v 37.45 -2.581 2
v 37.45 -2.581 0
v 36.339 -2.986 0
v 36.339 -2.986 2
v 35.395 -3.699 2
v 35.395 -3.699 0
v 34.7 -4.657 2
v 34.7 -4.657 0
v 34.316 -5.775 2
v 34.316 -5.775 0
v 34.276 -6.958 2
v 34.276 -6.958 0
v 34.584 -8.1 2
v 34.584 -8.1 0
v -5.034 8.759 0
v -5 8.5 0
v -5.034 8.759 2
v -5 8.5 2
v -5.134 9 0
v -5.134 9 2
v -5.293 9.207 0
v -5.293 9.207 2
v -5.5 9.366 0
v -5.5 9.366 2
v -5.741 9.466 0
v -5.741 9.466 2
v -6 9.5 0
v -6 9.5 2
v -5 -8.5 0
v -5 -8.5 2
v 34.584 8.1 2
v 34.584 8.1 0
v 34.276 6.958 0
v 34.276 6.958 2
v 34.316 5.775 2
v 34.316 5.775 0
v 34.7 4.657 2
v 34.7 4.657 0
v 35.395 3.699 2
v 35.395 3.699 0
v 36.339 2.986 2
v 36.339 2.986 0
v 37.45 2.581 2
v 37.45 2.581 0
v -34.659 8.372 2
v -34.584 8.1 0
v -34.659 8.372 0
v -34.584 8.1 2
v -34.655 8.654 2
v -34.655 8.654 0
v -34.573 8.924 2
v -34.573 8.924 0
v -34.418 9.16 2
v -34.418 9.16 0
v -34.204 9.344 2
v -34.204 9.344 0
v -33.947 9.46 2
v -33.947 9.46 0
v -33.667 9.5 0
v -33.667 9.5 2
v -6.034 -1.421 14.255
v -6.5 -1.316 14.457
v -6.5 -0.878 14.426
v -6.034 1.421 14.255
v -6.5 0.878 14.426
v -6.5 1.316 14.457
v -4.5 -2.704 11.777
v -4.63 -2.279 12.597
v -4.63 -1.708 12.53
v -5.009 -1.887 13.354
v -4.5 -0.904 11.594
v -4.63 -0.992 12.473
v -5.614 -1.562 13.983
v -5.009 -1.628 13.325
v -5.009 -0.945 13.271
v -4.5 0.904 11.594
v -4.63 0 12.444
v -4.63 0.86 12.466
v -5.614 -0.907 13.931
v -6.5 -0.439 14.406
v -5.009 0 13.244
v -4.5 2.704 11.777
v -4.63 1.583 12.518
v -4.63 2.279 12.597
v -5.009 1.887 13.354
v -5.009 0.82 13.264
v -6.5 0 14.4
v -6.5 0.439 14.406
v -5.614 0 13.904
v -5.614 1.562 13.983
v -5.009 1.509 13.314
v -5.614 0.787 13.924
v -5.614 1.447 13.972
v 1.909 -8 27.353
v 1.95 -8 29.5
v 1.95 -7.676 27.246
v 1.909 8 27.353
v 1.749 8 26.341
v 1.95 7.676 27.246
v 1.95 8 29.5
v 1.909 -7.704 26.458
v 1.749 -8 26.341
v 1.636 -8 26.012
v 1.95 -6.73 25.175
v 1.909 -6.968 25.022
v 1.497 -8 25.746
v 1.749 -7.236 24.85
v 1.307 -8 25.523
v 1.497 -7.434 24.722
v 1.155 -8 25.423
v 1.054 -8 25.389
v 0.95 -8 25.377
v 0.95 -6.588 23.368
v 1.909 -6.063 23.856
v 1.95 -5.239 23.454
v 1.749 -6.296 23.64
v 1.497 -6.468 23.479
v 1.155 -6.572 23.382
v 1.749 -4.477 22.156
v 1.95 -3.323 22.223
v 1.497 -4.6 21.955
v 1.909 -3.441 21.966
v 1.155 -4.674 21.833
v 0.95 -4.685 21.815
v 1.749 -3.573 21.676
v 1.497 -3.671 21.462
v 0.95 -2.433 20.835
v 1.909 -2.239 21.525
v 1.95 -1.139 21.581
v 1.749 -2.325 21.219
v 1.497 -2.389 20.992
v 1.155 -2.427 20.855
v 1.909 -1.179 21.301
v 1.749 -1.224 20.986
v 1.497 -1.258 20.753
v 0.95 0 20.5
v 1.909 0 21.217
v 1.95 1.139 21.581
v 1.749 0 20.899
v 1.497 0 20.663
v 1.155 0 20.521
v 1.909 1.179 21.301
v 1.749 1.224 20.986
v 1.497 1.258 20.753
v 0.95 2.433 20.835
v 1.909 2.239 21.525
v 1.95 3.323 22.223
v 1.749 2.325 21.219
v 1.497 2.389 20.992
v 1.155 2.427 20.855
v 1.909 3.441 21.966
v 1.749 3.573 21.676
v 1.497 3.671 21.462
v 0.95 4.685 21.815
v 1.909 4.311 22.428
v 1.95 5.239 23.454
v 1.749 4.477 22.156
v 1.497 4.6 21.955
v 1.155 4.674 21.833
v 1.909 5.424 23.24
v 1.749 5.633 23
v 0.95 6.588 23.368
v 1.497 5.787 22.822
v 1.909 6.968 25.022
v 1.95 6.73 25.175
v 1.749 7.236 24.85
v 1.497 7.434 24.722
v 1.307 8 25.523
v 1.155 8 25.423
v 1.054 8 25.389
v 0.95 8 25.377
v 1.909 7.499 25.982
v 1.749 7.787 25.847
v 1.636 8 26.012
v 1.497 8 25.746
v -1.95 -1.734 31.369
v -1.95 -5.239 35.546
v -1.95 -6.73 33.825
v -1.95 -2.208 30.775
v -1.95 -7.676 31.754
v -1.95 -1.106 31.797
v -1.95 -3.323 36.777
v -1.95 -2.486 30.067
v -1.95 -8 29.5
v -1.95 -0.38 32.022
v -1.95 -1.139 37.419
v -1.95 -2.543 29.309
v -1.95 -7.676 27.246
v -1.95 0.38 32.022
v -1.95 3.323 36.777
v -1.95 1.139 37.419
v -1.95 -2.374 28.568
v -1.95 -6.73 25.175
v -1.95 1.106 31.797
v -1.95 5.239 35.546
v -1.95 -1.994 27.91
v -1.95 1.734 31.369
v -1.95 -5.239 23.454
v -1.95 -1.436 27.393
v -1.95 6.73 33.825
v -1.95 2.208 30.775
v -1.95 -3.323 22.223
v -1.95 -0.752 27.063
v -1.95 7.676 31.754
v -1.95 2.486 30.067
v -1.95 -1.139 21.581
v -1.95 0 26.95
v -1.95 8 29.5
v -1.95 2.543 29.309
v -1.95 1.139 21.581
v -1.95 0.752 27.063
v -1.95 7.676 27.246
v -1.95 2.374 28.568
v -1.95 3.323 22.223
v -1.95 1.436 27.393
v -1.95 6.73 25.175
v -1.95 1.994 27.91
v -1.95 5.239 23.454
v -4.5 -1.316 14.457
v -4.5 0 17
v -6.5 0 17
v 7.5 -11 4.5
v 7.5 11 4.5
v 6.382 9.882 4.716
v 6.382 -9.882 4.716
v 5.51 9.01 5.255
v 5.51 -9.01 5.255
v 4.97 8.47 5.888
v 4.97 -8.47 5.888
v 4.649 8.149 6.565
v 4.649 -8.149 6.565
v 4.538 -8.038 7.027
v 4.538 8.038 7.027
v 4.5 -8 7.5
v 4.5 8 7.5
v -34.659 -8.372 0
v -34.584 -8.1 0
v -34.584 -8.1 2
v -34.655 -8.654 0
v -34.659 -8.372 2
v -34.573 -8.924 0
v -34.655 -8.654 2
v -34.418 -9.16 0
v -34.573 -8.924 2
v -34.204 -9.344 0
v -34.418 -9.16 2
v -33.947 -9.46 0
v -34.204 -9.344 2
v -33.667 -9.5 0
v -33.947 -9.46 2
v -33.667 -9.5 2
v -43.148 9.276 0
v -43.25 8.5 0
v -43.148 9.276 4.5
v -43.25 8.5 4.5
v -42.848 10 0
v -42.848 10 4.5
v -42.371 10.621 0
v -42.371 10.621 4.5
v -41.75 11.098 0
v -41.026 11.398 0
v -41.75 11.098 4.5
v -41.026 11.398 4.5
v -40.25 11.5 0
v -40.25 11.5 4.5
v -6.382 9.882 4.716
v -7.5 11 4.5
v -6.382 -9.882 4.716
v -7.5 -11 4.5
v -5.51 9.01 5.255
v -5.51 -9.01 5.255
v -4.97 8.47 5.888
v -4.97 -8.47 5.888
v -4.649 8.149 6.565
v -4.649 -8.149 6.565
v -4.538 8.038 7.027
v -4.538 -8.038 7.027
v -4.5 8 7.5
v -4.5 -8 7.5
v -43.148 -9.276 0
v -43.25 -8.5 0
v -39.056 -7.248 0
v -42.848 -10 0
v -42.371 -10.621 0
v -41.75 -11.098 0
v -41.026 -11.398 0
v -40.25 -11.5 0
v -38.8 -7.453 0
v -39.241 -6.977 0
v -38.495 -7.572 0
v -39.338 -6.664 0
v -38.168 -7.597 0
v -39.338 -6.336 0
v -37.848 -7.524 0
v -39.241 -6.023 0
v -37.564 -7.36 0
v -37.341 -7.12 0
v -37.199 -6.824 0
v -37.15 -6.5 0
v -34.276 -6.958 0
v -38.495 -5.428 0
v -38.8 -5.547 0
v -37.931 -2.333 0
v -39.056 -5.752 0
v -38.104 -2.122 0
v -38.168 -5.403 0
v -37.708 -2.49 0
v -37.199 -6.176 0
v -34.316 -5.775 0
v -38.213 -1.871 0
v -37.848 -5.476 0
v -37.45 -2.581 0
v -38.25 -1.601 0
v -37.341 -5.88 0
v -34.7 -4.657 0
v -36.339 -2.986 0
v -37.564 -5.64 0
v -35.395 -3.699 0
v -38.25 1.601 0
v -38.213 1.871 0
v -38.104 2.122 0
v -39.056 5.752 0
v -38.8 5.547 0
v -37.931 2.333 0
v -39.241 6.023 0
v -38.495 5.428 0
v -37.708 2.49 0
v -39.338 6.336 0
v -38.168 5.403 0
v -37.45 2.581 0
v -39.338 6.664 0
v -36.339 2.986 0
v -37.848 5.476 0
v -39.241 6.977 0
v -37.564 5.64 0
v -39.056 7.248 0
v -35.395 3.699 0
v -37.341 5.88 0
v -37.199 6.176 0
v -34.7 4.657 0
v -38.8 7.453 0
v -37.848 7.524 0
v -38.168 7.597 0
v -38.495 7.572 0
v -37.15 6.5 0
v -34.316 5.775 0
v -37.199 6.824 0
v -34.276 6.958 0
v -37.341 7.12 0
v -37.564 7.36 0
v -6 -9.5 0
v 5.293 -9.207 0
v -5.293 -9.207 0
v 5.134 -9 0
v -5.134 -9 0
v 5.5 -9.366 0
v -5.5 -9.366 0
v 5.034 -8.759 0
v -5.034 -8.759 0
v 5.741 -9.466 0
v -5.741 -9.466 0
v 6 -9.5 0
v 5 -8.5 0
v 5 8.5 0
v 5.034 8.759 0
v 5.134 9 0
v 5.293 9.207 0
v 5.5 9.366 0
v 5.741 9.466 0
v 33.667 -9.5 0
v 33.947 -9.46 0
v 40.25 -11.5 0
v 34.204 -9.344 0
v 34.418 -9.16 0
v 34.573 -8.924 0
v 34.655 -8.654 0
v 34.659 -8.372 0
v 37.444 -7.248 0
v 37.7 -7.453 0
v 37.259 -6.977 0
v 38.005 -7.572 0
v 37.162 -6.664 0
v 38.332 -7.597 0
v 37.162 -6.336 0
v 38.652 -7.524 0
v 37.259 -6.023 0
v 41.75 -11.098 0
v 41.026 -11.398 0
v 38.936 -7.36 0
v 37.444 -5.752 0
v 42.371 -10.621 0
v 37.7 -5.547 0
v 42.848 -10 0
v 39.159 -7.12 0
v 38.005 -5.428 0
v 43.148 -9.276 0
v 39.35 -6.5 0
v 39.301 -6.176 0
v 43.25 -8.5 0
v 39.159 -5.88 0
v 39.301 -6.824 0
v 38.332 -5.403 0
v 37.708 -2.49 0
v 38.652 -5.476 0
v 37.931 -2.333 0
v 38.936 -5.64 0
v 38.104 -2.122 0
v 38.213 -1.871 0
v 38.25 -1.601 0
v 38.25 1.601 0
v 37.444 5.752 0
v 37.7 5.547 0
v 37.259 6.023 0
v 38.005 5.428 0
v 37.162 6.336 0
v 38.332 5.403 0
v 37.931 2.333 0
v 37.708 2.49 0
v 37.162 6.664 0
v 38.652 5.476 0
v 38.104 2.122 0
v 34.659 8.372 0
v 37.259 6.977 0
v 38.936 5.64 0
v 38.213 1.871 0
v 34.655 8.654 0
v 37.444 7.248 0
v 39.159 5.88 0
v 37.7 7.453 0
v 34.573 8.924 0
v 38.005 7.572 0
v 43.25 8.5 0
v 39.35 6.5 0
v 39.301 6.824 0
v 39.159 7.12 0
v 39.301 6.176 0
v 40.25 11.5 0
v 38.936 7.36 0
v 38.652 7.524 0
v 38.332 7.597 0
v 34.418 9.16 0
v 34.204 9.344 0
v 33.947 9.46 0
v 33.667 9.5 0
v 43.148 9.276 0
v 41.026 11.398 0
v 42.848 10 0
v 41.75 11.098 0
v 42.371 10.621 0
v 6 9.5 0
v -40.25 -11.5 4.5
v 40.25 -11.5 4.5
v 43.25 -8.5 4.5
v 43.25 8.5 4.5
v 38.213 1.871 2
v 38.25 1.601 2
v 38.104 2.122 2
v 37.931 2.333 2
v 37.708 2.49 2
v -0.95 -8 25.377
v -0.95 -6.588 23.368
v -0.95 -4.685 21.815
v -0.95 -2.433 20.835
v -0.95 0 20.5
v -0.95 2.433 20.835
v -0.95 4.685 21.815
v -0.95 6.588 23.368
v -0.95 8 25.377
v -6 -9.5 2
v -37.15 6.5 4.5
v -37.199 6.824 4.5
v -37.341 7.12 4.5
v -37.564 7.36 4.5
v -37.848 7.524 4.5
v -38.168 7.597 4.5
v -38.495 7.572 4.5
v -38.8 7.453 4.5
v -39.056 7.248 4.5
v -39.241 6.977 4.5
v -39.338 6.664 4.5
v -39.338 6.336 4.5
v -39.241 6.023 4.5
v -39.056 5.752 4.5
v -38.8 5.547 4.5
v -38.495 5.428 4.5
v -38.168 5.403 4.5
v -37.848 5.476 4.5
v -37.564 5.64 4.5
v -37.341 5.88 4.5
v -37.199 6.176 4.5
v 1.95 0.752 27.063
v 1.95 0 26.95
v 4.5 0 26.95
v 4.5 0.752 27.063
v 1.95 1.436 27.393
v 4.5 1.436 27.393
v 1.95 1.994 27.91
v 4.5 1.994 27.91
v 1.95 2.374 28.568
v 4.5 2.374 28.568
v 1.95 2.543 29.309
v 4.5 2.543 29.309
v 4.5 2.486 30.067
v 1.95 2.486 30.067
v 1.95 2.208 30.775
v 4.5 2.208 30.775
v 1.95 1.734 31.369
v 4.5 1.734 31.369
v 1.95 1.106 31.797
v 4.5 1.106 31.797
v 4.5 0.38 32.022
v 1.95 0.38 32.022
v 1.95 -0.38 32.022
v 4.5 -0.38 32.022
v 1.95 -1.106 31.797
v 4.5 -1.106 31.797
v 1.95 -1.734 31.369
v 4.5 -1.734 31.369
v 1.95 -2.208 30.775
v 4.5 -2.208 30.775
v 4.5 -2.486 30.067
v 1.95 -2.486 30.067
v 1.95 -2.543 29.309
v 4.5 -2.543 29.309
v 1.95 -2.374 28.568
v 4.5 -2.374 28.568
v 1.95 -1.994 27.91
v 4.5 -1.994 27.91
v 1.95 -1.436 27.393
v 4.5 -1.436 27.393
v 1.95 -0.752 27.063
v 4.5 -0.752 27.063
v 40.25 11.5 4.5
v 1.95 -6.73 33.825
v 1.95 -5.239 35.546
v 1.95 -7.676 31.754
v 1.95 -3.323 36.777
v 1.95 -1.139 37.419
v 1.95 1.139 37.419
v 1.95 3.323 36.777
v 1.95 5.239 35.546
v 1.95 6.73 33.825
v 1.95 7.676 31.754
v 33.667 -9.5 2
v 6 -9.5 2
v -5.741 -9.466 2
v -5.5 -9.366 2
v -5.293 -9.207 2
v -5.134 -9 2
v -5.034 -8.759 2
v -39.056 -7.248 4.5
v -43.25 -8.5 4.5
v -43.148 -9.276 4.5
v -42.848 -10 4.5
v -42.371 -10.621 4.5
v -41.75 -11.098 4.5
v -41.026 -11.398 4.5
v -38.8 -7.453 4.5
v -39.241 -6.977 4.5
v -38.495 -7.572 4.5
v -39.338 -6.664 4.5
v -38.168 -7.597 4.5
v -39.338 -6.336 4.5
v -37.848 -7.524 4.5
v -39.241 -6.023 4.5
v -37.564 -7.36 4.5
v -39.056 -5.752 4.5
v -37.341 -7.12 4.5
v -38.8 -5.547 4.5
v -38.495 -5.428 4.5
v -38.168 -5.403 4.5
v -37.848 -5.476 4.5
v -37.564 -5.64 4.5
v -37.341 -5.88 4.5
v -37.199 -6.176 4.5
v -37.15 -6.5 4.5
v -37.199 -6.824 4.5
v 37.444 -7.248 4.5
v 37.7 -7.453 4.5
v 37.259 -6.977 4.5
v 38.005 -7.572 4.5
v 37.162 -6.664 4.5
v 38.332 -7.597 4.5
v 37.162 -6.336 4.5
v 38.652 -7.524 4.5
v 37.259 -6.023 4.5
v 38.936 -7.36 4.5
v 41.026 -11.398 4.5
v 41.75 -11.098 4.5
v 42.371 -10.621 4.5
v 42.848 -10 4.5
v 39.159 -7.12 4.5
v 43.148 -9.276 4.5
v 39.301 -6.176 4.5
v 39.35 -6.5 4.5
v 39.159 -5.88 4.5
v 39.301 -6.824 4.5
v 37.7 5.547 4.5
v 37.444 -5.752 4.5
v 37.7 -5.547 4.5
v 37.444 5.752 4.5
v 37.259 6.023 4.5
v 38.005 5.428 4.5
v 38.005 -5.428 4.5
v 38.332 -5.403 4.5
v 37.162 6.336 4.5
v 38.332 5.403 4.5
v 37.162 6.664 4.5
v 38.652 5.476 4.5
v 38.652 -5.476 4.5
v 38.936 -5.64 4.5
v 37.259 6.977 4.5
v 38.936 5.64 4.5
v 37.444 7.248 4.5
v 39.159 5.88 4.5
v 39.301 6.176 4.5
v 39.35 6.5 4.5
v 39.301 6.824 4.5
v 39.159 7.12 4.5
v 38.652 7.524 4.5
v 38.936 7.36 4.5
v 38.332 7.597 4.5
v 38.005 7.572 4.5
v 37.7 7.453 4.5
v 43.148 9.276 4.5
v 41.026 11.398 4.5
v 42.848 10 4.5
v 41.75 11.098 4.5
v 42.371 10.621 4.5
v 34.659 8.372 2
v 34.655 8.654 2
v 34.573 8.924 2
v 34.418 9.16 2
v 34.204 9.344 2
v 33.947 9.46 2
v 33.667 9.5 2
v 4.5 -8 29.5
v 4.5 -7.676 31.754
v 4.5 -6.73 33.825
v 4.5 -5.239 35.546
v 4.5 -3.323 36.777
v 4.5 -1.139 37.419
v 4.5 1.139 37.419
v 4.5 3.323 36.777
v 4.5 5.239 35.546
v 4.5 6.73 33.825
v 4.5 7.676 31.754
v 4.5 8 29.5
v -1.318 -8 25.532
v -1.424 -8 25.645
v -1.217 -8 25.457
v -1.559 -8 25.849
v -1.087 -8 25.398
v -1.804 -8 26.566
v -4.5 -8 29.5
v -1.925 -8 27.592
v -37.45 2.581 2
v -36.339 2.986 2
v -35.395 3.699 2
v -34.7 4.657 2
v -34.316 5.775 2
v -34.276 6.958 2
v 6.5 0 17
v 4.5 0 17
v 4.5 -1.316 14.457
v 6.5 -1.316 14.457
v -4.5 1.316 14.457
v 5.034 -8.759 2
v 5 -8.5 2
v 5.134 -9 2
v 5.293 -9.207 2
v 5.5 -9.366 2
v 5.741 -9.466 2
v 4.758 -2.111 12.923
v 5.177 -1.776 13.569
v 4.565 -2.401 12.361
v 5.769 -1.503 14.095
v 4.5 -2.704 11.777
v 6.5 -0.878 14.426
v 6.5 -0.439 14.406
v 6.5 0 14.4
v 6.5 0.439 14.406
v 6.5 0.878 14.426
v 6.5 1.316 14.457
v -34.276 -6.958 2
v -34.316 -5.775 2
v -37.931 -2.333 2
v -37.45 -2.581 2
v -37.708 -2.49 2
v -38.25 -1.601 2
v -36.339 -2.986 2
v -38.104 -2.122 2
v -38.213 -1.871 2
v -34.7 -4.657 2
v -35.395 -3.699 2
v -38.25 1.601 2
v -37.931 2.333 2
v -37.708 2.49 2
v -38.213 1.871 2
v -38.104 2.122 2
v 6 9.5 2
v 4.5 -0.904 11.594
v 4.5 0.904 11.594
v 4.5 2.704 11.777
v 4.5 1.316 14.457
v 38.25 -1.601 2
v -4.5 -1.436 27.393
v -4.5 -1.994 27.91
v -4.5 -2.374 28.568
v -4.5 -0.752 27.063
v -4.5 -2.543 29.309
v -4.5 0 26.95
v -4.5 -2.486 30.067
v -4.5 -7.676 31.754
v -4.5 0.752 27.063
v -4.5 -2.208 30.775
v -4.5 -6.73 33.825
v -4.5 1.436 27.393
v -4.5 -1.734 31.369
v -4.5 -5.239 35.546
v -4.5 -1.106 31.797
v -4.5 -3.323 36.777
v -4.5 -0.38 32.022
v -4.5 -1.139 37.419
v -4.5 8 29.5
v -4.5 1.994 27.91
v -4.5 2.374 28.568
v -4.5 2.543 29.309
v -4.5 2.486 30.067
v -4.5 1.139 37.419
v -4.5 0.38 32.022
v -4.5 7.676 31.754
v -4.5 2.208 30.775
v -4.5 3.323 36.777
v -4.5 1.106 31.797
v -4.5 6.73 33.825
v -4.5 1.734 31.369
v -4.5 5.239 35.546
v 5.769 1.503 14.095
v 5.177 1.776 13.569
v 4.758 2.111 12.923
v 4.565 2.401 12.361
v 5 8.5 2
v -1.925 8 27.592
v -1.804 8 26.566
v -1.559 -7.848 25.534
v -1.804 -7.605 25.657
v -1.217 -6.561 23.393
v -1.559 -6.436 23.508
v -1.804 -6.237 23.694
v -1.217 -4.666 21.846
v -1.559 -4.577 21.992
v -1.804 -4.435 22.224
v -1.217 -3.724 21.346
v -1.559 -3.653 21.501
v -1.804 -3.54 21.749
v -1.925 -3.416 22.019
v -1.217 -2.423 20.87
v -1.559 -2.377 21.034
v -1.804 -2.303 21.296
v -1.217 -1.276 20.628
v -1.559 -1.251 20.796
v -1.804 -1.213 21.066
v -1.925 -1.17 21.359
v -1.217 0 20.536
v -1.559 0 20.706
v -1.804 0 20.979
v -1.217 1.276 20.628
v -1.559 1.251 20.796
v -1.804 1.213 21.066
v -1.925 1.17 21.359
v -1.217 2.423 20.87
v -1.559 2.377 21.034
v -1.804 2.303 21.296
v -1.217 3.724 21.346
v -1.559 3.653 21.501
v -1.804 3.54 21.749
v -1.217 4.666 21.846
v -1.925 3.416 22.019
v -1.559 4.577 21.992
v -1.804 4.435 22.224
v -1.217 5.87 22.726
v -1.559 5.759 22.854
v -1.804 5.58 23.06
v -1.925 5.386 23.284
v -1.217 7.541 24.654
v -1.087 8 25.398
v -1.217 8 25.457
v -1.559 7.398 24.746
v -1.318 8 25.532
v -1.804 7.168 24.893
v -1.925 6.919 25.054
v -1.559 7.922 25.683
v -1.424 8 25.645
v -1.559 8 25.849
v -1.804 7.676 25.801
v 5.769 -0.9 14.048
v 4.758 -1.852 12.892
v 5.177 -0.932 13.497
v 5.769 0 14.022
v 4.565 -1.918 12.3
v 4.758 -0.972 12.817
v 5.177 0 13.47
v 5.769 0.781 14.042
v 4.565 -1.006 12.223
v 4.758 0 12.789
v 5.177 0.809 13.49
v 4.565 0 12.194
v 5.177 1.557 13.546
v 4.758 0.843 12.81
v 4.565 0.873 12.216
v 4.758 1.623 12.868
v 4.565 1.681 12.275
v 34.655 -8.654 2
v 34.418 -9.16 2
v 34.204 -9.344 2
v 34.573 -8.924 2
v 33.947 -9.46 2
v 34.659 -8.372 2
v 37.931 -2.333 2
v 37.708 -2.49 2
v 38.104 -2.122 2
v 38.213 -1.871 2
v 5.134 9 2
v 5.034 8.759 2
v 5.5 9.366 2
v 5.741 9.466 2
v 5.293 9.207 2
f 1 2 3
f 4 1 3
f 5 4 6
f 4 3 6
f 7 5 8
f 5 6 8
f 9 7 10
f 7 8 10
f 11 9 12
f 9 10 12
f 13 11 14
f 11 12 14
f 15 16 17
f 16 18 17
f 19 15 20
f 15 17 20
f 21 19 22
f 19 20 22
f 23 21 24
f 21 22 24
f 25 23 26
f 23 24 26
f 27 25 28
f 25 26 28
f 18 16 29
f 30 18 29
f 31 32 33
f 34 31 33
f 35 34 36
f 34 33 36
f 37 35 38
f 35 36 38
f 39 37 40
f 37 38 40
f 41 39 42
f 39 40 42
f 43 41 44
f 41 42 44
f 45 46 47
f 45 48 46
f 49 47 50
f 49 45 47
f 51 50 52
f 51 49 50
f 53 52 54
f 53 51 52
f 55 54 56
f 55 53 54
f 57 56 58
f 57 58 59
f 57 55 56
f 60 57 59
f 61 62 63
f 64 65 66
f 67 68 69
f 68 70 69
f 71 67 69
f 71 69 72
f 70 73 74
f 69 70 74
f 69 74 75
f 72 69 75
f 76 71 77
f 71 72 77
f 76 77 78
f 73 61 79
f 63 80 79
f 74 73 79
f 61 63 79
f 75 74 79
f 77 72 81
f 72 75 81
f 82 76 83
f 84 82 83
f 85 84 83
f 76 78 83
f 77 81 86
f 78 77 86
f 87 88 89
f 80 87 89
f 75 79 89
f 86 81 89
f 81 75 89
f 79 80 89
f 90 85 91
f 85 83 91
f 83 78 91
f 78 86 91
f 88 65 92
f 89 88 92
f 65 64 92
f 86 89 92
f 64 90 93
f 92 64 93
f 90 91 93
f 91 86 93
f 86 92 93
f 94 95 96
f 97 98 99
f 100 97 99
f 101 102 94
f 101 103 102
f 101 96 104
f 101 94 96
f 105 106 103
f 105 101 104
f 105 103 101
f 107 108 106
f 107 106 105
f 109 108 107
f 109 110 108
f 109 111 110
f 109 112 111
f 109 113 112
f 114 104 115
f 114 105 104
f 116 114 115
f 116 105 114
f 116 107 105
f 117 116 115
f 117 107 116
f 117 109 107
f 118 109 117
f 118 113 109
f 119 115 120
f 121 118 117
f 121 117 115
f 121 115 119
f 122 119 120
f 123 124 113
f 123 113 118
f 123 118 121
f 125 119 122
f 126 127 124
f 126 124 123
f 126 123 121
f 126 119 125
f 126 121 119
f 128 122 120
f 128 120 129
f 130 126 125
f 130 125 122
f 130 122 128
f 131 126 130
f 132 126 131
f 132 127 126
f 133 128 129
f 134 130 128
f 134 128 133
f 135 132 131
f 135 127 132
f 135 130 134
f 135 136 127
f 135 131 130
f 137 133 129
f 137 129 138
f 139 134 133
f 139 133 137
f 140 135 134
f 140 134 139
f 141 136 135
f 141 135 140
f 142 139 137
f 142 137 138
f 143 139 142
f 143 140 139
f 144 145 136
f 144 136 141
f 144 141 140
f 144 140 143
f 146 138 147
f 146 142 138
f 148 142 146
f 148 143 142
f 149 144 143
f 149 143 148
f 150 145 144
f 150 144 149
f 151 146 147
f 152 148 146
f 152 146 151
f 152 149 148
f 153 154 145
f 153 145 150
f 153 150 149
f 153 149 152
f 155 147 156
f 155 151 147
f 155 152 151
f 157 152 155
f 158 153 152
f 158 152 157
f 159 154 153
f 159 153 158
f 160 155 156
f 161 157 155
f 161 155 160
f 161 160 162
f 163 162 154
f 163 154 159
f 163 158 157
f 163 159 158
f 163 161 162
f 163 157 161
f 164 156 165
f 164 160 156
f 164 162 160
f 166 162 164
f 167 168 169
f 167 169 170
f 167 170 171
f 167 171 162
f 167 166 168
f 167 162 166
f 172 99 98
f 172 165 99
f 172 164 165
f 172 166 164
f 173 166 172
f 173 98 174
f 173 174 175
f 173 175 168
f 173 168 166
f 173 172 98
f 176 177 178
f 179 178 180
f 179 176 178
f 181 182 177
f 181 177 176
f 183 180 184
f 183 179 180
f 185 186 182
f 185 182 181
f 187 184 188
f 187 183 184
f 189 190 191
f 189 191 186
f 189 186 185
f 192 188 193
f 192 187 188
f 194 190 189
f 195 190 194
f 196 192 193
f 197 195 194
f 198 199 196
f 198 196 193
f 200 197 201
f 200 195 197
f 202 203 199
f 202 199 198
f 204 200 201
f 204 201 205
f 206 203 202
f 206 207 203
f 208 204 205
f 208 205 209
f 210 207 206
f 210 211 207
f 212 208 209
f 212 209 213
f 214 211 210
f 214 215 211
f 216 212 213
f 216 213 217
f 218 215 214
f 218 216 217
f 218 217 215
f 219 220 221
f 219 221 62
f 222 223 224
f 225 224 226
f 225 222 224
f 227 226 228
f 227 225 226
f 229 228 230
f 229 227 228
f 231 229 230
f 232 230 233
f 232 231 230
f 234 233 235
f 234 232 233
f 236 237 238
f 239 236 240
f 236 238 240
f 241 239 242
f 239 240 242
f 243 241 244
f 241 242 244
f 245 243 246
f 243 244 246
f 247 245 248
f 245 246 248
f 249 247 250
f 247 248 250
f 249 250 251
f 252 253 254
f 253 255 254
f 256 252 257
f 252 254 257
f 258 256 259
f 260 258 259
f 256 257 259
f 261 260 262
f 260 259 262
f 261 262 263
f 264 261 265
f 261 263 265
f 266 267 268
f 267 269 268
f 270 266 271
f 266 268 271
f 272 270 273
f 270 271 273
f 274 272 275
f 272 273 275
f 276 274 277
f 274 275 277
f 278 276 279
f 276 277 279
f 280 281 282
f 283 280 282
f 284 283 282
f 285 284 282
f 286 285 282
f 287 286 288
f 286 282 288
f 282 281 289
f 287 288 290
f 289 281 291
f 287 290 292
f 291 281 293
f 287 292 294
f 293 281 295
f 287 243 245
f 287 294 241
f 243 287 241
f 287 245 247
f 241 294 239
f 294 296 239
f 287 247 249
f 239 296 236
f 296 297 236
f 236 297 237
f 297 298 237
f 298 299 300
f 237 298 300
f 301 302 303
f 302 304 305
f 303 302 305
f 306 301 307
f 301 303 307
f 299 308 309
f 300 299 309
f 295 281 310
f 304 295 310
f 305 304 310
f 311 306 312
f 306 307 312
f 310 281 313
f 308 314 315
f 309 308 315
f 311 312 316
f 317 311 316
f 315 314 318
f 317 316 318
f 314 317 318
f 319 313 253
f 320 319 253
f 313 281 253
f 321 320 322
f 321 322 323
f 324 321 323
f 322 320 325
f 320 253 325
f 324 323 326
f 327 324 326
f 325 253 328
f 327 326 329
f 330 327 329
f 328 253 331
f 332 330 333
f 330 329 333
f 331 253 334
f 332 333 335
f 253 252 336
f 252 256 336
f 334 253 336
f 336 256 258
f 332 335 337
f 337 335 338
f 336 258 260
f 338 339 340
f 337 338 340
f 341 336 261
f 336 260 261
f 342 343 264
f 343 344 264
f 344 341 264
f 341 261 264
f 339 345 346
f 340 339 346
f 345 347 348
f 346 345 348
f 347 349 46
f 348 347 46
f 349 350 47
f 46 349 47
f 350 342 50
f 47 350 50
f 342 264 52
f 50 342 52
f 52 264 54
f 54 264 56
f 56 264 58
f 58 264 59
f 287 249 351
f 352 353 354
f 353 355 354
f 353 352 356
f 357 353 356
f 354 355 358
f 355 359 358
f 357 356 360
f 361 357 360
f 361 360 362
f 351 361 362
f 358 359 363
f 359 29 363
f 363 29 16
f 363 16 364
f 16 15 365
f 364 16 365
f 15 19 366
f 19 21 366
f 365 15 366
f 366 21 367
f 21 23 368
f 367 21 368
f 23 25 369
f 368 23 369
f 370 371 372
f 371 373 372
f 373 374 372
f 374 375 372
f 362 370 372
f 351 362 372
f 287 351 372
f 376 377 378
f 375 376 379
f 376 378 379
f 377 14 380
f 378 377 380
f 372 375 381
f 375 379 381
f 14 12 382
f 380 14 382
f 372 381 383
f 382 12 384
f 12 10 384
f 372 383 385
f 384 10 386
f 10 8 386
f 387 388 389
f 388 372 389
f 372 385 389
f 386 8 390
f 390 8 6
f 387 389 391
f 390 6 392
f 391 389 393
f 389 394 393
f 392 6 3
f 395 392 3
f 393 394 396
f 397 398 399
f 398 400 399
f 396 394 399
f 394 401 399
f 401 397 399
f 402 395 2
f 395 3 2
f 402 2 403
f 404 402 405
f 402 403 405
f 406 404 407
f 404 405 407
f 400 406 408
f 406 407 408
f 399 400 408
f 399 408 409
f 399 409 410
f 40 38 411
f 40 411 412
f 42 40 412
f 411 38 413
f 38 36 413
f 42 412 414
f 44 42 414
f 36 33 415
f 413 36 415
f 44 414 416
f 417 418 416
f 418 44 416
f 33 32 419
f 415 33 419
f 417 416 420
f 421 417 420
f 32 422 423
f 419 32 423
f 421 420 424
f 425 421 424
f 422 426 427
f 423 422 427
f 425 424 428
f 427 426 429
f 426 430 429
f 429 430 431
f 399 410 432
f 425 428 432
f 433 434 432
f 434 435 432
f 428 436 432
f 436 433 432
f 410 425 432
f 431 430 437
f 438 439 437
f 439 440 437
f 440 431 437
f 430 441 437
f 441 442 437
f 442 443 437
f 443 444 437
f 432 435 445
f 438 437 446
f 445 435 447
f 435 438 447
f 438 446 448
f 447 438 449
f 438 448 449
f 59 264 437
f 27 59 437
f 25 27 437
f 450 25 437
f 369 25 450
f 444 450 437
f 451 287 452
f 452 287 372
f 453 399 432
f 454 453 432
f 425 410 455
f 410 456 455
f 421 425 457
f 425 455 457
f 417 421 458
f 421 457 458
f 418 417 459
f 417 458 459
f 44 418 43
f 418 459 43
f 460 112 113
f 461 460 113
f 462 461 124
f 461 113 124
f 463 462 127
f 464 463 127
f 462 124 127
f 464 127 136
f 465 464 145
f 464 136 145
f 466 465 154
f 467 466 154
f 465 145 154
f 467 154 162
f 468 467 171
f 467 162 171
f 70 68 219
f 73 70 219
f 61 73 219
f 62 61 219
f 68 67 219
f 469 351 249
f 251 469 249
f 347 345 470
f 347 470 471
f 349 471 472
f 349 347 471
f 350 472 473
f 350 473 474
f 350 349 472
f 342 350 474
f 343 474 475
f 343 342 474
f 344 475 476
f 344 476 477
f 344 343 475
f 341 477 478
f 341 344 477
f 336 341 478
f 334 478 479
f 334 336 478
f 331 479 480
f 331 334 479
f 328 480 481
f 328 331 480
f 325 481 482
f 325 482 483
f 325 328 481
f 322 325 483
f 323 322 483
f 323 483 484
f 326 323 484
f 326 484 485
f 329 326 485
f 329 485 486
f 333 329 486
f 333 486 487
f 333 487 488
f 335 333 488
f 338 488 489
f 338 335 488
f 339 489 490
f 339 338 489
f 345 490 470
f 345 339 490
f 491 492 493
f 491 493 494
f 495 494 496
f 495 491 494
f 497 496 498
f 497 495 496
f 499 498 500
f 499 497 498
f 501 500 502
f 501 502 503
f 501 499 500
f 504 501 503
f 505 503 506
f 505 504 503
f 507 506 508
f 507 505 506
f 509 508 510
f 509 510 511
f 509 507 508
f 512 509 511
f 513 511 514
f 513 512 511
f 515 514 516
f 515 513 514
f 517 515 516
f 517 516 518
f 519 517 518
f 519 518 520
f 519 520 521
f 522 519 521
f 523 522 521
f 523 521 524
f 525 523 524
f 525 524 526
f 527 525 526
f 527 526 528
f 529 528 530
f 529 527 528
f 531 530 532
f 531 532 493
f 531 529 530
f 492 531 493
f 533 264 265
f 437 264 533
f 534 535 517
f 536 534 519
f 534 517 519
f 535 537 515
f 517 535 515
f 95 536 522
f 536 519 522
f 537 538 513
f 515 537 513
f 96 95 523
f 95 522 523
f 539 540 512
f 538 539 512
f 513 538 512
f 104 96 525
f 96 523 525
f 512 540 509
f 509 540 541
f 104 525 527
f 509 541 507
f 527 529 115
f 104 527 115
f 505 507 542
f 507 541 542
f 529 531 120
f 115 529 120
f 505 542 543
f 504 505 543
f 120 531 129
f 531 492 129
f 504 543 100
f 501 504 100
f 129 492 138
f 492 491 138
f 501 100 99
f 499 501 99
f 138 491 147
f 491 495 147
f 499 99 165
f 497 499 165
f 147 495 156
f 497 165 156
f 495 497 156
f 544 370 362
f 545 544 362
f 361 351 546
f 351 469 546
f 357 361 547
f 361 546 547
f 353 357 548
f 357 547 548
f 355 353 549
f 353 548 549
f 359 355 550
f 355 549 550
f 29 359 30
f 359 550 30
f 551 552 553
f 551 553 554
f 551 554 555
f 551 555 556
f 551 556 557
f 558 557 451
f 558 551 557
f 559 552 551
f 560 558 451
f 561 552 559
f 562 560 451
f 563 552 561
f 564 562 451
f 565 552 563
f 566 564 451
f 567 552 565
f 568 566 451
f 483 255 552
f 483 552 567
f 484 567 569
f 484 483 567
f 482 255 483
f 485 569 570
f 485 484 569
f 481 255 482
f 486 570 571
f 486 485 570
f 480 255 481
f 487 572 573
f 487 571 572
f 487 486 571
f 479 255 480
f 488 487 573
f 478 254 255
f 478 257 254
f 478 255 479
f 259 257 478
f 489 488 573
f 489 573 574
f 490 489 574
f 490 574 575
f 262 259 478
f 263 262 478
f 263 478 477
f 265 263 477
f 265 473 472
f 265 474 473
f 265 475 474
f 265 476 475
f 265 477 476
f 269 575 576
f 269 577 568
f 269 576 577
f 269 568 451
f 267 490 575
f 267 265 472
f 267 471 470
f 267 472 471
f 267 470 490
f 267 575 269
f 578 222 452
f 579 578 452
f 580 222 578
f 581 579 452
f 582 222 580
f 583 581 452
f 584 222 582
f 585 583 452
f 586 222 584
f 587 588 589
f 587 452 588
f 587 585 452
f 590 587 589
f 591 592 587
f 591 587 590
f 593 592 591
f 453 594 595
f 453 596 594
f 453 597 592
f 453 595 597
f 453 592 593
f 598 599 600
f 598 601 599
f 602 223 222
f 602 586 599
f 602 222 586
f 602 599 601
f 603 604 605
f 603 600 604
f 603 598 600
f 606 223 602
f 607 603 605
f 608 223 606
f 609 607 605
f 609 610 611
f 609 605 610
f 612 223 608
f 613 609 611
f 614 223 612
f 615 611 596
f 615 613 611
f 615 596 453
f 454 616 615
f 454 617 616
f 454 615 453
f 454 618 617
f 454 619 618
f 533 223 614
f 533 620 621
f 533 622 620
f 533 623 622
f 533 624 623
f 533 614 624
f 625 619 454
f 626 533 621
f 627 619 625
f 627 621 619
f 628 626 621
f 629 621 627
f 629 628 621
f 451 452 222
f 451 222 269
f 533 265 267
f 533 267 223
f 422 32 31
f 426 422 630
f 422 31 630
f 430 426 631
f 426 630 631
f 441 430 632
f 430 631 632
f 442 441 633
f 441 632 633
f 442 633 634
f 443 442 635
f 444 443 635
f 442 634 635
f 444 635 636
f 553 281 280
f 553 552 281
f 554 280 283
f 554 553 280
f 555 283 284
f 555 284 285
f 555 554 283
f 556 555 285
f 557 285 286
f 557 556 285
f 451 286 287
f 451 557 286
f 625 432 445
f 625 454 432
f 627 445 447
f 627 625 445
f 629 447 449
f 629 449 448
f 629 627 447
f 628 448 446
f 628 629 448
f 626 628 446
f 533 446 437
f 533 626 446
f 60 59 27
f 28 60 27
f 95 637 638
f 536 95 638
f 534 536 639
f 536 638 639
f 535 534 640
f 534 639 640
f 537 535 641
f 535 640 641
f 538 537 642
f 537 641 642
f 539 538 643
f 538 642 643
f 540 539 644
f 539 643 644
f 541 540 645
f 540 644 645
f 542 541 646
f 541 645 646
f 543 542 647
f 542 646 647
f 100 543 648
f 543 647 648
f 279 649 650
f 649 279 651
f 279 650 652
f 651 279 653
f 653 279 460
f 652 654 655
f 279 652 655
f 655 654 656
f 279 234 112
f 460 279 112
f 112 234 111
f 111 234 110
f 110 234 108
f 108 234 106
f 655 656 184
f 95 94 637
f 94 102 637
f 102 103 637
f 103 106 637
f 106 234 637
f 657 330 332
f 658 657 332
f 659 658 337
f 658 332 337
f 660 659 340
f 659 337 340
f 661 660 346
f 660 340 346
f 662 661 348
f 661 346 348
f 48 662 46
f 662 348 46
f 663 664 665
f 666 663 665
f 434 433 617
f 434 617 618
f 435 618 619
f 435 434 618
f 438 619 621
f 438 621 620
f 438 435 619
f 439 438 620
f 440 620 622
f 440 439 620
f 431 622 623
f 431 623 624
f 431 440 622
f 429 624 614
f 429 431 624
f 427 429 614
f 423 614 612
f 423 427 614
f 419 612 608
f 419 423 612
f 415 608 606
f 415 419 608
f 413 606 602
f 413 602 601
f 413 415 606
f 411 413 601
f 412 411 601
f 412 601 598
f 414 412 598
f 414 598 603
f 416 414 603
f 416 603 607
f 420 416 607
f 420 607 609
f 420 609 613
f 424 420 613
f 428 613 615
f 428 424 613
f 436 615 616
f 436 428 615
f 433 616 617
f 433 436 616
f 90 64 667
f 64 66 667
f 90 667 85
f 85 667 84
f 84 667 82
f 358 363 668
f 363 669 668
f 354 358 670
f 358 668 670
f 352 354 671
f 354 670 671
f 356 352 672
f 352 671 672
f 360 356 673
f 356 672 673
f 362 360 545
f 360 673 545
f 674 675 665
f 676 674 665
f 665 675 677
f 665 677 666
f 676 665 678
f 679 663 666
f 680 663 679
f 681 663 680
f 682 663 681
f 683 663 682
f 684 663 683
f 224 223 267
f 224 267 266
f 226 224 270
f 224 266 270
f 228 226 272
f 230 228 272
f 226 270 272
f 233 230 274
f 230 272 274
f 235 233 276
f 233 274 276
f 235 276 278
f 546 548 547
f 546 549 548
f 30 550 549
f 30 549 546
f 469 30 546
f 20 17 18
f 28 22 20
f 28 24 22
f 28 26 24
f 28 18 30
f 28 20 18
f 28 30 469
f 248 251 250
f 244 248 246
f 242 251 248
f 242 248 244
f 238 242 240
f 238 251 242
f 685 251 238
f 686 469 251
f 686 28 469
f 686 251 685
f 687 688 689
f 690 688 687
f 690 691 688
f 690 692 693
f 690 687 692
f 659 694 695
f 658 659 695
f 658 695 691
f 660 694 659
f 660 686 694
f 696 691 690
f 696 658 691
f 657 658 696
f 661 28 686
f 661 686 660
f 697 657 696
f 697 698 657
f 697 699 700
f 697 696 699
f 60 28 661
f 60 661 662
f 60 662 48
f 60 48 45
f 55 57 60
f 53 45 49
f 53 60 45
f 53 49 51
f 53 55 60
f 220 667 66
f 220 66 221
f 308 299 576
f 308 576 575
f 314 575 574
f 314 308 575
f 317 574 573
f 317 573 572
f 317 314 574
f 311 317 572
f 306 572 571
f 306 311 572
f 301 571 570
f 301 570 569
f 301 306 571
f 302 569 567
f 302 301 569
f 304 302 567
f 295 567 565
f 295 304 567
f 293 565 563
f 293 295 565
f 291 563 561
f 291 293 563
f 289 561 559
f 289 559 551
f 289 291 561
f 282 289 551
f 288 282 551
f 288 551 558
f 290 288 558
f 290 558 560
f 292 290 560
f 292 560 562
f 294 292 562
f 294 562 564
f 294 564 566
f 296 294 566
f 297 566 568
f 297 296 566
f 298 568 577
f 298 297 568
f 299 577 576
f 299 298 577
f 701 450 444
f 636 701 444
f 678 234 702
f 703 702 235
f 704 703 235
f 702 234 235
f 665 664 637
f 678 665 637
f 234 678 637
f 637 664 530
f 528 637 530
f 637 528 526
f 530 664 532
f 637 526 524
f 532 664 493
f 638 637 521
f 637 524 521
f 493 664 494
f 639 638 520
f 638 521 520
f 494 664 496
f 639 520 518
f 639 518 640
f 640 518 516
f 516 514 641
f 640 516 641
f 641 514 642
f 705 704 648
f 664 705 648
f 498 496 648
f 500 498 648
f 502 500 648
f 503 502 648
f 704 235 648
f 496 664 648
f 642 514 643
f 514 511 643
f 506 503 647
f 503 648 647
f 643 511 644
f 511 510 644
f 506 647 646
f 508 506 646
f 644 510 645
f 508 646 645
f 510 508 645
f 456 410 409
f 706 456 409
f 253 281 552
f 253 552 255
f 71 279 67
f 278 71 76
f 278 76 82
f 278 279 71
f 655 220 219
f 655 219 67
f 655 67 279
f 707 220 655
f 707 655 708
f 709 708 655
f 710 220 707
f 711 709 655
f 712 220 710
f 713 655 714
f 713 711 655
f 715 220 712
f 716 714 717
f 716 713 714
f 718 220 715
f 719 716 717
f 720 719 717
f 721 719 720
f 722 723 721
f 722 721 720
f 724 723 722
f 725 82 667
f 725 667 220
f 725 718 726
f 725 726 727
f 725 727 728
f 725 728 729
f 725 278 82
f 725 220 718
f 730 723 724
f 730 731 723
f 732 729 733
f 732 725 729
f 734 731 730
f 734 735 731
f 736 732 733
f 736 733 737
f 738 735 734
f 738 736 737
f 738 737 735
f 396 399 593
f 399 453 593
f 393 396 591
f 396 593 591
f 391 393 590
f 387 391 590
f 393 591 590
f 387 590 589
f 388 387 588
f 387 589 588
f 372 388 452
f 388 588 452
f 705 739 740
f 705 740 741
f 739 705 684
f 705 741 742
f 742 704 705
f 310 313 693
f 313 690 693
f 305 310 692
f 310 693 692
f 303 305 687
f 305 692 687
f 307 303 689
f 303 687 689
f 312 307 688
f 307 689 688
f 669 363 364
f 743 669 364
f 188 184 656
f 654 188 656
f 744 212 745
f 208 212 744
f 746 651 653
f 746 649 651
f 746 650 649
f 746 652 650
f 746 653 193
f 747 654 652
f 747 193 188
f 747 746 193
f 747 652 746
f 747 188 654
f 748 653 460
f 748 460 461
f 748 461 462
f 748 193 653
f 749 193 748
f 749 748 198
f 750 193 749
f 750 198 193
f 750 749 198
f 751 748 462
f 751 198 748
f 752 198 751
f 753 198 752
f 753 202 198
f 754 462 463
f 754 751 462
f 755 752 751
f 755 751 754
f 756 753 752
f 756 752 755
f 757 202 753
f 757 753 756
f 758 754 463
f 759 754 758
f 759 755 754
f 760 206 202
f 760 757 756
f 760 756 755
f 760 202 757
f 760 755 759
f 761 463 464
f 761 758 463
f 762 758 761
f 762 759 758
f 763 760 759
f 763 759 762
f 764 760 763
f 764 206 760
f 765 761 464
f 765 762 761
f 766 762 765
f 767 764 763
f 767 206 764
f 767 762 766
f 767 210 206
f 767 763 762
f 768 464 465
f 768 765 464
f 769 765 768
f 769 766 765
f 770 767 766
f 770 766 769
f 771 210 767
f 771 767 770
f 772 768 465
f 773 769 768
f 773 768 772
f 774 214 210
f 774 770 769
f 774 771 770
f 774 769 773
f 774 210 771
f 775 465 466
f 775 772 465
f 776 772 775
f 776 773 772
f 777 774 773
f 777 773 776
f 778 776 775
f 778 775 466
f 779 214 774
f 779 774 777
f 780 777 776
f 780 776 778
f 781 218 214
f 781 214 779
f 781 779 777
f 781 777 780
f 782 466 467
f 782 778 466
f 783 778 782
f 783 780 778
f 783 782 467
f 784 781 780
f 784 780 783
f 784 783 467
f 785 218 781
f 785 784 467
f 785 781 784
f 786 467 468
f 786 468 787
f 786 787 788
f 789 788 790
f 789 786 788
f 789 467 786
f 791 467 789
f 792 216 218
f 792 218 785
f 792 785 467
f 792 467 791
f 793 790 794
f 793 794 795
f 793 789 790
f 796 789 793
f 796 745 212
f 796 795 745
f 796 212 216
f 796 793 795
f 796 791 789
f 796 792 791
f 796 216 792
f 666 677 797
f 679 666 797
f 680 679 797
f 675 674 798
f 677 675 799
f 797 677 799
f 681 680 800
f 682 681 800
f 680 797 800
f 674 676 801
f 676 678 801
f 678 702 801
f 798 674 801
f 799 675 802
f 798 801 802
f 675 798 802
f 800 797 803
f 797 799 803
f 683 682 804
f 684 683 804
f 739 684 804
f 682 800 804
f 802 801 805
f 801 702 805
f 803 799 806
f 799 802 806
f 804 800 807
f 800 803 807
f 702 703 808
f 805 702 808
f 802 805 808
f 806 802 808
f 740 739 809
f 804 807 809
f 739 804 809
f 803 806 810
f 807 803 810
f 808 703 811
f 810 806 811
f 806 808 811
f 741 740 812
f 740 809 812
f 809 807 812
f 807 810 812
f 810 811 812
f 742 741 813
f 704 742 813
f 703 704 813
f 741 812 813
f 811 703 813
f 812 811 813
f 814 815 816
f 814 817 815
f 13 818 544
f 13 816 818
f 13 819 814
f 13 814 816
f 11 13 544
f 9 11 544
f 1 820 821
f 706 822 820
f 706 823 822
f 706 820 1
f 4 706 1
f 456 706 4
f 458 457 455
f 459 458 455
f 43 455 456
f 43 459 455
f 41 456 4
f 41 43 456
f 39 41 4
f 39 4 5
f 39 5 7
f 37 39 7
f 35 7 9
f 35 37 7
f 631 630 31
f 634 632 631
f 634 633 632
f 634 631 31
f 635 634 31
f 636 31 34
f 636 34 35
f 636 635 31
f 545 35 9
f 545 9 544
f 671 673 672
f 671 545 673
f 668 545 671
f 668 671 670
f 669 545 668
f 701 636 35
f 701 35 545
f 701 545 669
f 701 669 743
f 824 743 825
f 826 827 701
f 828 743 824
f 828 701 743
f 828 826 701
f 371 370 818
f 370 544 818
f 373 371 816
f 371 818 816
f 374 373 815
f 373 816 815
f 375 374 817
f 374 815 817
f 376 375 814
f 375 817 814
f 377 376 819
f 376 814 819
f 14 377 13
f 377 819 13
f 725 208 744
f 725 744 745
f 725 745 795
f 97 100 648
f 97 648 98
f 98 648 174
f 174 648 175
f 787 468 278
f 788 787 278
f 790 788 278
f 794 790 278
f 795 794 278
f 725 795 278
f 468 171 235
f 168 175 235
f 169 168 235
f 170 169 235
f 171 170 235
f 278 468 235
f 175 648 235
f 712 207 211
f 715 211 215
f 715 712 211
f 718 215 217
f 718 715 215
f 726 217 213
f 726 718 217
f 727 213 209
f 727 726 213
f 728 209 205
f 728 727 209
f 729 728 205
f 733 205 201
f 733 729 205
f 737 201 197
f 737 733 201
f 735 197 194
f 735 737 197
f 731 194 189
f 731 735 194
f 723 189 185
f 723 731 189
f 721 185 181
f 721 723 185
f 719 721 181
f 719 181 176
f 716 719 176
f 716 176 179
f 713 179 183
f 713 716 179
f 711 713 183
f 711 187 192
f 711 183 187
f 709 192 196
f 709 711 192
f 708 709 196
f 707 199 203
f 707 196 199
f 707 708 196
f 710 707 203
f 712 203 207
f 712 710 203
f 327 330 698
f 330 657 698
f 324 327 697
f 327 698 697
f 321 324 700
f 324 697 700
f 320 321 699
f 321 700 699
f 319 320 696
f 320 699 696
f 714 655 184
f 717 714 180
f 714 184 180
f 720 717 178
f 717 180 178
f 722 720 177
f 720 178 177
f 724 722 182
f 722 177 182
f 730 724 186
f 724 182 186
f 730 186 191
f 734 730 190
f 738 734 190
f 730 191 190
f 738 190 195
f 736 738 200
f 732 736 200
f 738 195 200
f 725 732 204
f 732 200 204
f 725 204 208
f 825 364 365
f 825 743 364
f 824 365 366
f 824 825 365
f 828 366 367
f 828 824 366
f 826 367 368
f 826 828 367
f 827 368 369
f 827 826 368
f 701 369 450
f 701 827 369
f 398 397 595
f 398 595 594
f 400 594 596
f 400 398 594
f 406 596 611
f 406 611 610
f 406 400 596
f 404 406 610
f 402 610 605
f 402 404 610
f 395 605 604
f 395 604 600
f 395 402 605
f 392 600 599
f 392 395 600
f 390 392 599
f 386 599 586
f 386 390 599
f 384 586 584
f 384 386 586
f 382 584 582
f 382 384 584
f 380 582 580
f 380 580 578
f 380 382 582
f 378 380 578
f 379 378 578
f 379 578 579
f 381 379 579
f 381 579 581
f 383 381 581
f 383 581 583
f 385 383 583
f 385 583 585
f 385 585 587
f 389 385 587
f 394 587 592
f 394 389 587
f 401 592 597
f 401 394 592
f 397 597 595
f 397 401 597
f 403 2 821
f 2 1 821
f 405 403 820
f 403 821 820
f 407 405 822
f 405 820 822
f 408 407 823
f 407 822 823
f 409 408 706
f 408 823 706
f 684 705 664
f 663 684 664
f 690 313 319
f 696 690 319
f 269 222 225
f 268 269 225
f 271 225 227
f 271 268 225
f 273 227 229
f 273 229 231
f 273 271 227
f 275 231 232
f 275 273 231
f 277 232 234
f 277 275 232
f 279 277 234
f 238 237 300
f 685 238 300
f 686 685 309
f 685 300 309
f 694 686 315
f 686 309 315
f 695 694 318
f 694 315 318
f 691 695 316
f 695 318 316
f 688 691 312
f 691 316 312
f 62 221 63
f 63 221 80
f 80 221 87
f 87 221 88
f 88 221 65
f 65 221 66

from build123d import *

# Parameters (mm, degrees)
SKETCH1_W           = 86.5
SKETCH1_H           = 23
SKETCH1_R           = 1.1
BOSS_EXTRUDE1_DEPTH = 4.5
CUT_EXTRUDE1_DEPTH  = 2
SKETCH3_R           = 2.55
BOSS_EXTRUDE2_DEPTH = 4.5
SKETCH6_R           = 9
CUT_EXTRUDE3_DEPTH  = 1.95
FILLET1_R           = 3
FILLET2_R           = 1
FILLET3_R           = 1
BOSS_EXTRUDE3_DEPTH = 2
FILLET4_R           = 3


with BuildPart() as part:
    # Sketch1 → Boss-Extrude1 (new body)
    with BuildSketch(Plane.XY):
        Rectangle(SKETCH1_W, SKETCH1_H)
        with Locations((38.25, 6.5)):
            Circle(SKETCH1_R, mode=Mode.SUBTRACT)
        with Locations((38.25, -6.5)):
            Circle(SKETCH1_R, mode=Mode.SUBTRACT)
        with Locations((-38.25, -6.5)):
            Circle(SKETCH1_R, mode=Mode.SUBTRACT)
        with Locations((-38.25, 6.5)):
            Circle(SKETCH1_R, mode=Mode.SUBTRACT)
    extrude(amount=BOSS_EXTRUDE1_DEPTH)

    # Sketch2 → Cut-Extrude1 (cut)
    with BuildSketch(Plane(origin=(0, 0, 0), x_dir=(-1, 0, 0), z_dir=(0, 0, -1))):
        with BuildLine():
            Line((-5, 9.5), (-35.604248689, 9.5))
            ThreePointArc((-35.604248689, 9.5), (-34.508342613, 5.085786438), (-38.25, 2.5))
            Line((-38.25, 2.5), (-38.25, -2.5))
            ThreePointArc((-38.25, -2.5), (-34.508342613, -5.085786438), (-35.604248689, -9.5))
            Line((-35.604248689, -9.5), (-5, -9.5))
            Line((-5, -9.5), (-5, 9.5))
        make_face()
        with BuildLine():
            Line((35.604248689, 9.5), (5, 9.5))
            Line((5, 9.5), (5, -9.5))
            Line((5, -9.5), (35.604248689, -9.5))
            ThreePointArc((35.604248689, -9.5), (34.508342613, -5.085786438), (38.25, -2.5))
            Line((38.25, -2.5), (38.25, 2.5))
            ThreePointArc((38.25, 2.5), (34.508342613, 5.085786438), (35.604248689, 9.5))
        make_face()
    extrude(amount=-CUT_EXTRUDE1_DEPTH, mode=Mode.SUBTRACT)

    # Sketch3 → Boss-Extrude2 (add, symmetric)
    with BuildSketch(Plane(origin=(0, 0, 0), x_dir=(0, 0, -1), z_dir=(1, 0, 0))):
        with BuildLine():
            Line((-29.5, 8), (-4.5, 8))
            Line((-4.5, 8), (-4.5, -8))
            Line((-4.5, -8), (-29.5, -8))
            ThreePointArc((-29.5, -8), (-37.5, 0), (-29.5, 8))
        make_face()
        with Locations((-29.5, 0)):
            Circle(SKETCH3_R, mode=Mode.SUBTRACT)
    extrude(amount=BOSS_EXTRUDE2_DEPTH, both=True)

    # Sketch6 → Cut-Extrude3 (cut, symmetric)
    with BuildSketch(Plane(origin=(0, 0, 0), x_dir=(0, 0, -1), z_dir=(1, 0, 0))):
        with Locations((-29.5, 0)):
            Circle(SKETCH6_R)
    extrude(amount=CUT_EXTRUDE3_DEPTH, both=True, mode=Mode.SUBTRACT)

    # Fillet1
    fillet1_edges = [part.edges().sort_by_distance(p)[0] for p in [
        (4.5, 0, 4.5),
        (-4.5, 0, 4.5),
        (0, -8, 4.5),
        (0, 8, 4.5),
        (43.25, -11.5, 2.25),
        (-43.25, -11.5, 2.25),
        (-43.25, 11.5, 2.25),
        (43.25, 11.5, 2.25),
    ]]
    fillet(fillet1_edges, radius=FILLET1_R)

    # Fillet2
    fillet2_edges = [part.edges().sort_by_distance(p)[0] for p in [
        (1.95, 0, 20.5),
        (-1.95, 0, 20.5),
    ]]
    fillet(fillet2_edges, radius=FILLET2_R)

    # Fillet3
    fillet3_edges = [part.edges().sort_by_distance(p)[0] for p in [
        (35.604248689, -9.5, 1),
        (38.25, -2.5, 1),
        (38.25, 2.5, 1),
        (35.604248689, 9.5, 1),
        (5, 9.5, 1),
        (5, -9.5, 1),
        (-35.604248689, -9.5, 1),
        (-5, -9.5, 1),
        (-5, 9.5, 1),
        (-35.604248689, 9.5, 1),
        (-38.25, 2.5, 1),
        (-38.25, -2.5, 1),
    ]]
    fillet(fillet3_edges, radius=FILLET3_R)

    # Sketch7 → Boss-Extrude3 (add)
    with BuildSketch(Plane(origin=(4.5, 0, 0), x_dir=(0, 0, -1), z_dir=(1, 0, 0))):
        Polygon((-14.457460059, 1.316051715), (-17, 0), (-14.457460059, 0), align=None)
        Polygon((-14.457460059, 0), (-17, 0), (-14.457460059, -1.316051715), align=None)
        with BuildLine():
            Line((-14.457460059, 0), (-14.457460059, -1.316051715))
            ThreePointArc((-14.457460059, -1.316051715), (-14.414371854, -0.658652749), (-14.4, 0))
            Line((-14.4, 0), (-14.457460059, 0))
        make_face()
        with BuildLine():
            ThreePointArc((-14.4, 0), (-14.414371854, 0.658652749), (-14.457460059, 1.316051715))
            Line((-14.457460059, 1.316051715), (-14.457460059, 0))
            Line((-14.457460059, 0), (-14.4, 0))
        make_face()
    boss_extrude3 = extrude(amount=BOSS_EXTRUDE3_DEPTH)

    # Mirror1: Boss-Extrude3 across plane
    add(boss_extrude3.mirror(Plane(origin=(0, 0, 0), x_dir=(0, 0, 1), z_dir=(1, 0, 0))))

    # Fillet4
    # the kernel refuses this fillet: 3 mm, written as the material it adds along each edge
    with BuildSketch(Plane(origin=(4.5, 0, 29.5), x_dir=(0, -0.5274118729194984, -0.8496097435314327), z_dir=(0, -0.8496097435314327, 0.5274118729194984))) as fillet4_piece_1_section:
        with BuildLine():
            CenterArc((17.928427125, 3), FILLET4_R, 199.471220634, 70.528779366)
            Line((15.1, 2), (15.043431458, 1.98))
            ThreePointArc((15.043431458, 1.98), (15.04, 1), (15.04, 0))
            Line((15.04, 0), (15.1, -0.06))
            Line((15.1, -0.06), (17.928427125, -0.06))
            Line((17.928427125, -0.06), (17.928427125, 0))
        make_face()
    fillet4_piece_1 = revolve(axis=Axis((4.5, 0, 29.5), (1, 0, 0)), revolution_arc=63.661503438, mode=Mode.PRIVATE)
    fillet4_piece_1 = split(fillet4_piece_1, bisect_by=Plane(origin=(4.961847774, -1.372551705, 14.348305169), z_dir=(0, 0.888082932047281, -0.4596832668330496)), keep=Keep.TOP, mode=Mode.PRIVATE)
    fillet4_piece_1 = split(fillet4_piece_1, bisect_by=Plane(origin=(4.961847774, 1.372551598, 14.348305377), z_dir=(0, -0.8880829320471848, -0.4596832668332354)), keep=Keep.TOP, mode=Mode.PRIVATE)
    add(fillet4_piece_1)
    with BuildSketch(Plane(origin=(-4.5, 0, 29.5), x_dir=(0, -0.5274118729194984, -0.8496097435314327), z_dir=(0, -0.8496097435314327, 0.5274118729194984))) as fillet4_piece_2_section:
        with BuildLine():
            CenterArc((17.928427125, -3), FILLET4_R, 90, 70.528779366)
            Line((15.1, -2), (15.043431458, -1.98))
            ThreePointArc((15.043431458, -1.98), (15.04, -1), (15.04, 0))
            Line((15.04, 0), (15.1, 0.06))
            Line((15.1, 0.06), (17.928427125, 0.06))
            Line((17.928427125, 0.06), (17.928427125, 0))
        make_face()
    fillet4_piece_2 = revolve(axis=Axis((-4.5, 0, 29.5), (1, 0, 0)), revolution_arc=63.661503438, mode=Mode.PRIVATE)
    fillet4_piece_2 = split(fillet4_piece_2, bisect_by=Plane(origin=(-4.961847774, -1.372551705, 14.348305169), z_dir=(0, 0.888082932047281, -0.4596832668330496)), keep=Keep.TOP, mode=Mode.PRIVATE)
    fillet4_piece_2 = split(fillet4_piece_2, bisect_by=Plane(origin=(-4.961847774, 1.372551598, 14.348305377), z_dir=(0, -0.8880829320471848, -0.4596832668332354)), keep=Keep.TOP, mode=Mode.PRIVATE)
    add(fillet4_piece_2)


solid = part.part
